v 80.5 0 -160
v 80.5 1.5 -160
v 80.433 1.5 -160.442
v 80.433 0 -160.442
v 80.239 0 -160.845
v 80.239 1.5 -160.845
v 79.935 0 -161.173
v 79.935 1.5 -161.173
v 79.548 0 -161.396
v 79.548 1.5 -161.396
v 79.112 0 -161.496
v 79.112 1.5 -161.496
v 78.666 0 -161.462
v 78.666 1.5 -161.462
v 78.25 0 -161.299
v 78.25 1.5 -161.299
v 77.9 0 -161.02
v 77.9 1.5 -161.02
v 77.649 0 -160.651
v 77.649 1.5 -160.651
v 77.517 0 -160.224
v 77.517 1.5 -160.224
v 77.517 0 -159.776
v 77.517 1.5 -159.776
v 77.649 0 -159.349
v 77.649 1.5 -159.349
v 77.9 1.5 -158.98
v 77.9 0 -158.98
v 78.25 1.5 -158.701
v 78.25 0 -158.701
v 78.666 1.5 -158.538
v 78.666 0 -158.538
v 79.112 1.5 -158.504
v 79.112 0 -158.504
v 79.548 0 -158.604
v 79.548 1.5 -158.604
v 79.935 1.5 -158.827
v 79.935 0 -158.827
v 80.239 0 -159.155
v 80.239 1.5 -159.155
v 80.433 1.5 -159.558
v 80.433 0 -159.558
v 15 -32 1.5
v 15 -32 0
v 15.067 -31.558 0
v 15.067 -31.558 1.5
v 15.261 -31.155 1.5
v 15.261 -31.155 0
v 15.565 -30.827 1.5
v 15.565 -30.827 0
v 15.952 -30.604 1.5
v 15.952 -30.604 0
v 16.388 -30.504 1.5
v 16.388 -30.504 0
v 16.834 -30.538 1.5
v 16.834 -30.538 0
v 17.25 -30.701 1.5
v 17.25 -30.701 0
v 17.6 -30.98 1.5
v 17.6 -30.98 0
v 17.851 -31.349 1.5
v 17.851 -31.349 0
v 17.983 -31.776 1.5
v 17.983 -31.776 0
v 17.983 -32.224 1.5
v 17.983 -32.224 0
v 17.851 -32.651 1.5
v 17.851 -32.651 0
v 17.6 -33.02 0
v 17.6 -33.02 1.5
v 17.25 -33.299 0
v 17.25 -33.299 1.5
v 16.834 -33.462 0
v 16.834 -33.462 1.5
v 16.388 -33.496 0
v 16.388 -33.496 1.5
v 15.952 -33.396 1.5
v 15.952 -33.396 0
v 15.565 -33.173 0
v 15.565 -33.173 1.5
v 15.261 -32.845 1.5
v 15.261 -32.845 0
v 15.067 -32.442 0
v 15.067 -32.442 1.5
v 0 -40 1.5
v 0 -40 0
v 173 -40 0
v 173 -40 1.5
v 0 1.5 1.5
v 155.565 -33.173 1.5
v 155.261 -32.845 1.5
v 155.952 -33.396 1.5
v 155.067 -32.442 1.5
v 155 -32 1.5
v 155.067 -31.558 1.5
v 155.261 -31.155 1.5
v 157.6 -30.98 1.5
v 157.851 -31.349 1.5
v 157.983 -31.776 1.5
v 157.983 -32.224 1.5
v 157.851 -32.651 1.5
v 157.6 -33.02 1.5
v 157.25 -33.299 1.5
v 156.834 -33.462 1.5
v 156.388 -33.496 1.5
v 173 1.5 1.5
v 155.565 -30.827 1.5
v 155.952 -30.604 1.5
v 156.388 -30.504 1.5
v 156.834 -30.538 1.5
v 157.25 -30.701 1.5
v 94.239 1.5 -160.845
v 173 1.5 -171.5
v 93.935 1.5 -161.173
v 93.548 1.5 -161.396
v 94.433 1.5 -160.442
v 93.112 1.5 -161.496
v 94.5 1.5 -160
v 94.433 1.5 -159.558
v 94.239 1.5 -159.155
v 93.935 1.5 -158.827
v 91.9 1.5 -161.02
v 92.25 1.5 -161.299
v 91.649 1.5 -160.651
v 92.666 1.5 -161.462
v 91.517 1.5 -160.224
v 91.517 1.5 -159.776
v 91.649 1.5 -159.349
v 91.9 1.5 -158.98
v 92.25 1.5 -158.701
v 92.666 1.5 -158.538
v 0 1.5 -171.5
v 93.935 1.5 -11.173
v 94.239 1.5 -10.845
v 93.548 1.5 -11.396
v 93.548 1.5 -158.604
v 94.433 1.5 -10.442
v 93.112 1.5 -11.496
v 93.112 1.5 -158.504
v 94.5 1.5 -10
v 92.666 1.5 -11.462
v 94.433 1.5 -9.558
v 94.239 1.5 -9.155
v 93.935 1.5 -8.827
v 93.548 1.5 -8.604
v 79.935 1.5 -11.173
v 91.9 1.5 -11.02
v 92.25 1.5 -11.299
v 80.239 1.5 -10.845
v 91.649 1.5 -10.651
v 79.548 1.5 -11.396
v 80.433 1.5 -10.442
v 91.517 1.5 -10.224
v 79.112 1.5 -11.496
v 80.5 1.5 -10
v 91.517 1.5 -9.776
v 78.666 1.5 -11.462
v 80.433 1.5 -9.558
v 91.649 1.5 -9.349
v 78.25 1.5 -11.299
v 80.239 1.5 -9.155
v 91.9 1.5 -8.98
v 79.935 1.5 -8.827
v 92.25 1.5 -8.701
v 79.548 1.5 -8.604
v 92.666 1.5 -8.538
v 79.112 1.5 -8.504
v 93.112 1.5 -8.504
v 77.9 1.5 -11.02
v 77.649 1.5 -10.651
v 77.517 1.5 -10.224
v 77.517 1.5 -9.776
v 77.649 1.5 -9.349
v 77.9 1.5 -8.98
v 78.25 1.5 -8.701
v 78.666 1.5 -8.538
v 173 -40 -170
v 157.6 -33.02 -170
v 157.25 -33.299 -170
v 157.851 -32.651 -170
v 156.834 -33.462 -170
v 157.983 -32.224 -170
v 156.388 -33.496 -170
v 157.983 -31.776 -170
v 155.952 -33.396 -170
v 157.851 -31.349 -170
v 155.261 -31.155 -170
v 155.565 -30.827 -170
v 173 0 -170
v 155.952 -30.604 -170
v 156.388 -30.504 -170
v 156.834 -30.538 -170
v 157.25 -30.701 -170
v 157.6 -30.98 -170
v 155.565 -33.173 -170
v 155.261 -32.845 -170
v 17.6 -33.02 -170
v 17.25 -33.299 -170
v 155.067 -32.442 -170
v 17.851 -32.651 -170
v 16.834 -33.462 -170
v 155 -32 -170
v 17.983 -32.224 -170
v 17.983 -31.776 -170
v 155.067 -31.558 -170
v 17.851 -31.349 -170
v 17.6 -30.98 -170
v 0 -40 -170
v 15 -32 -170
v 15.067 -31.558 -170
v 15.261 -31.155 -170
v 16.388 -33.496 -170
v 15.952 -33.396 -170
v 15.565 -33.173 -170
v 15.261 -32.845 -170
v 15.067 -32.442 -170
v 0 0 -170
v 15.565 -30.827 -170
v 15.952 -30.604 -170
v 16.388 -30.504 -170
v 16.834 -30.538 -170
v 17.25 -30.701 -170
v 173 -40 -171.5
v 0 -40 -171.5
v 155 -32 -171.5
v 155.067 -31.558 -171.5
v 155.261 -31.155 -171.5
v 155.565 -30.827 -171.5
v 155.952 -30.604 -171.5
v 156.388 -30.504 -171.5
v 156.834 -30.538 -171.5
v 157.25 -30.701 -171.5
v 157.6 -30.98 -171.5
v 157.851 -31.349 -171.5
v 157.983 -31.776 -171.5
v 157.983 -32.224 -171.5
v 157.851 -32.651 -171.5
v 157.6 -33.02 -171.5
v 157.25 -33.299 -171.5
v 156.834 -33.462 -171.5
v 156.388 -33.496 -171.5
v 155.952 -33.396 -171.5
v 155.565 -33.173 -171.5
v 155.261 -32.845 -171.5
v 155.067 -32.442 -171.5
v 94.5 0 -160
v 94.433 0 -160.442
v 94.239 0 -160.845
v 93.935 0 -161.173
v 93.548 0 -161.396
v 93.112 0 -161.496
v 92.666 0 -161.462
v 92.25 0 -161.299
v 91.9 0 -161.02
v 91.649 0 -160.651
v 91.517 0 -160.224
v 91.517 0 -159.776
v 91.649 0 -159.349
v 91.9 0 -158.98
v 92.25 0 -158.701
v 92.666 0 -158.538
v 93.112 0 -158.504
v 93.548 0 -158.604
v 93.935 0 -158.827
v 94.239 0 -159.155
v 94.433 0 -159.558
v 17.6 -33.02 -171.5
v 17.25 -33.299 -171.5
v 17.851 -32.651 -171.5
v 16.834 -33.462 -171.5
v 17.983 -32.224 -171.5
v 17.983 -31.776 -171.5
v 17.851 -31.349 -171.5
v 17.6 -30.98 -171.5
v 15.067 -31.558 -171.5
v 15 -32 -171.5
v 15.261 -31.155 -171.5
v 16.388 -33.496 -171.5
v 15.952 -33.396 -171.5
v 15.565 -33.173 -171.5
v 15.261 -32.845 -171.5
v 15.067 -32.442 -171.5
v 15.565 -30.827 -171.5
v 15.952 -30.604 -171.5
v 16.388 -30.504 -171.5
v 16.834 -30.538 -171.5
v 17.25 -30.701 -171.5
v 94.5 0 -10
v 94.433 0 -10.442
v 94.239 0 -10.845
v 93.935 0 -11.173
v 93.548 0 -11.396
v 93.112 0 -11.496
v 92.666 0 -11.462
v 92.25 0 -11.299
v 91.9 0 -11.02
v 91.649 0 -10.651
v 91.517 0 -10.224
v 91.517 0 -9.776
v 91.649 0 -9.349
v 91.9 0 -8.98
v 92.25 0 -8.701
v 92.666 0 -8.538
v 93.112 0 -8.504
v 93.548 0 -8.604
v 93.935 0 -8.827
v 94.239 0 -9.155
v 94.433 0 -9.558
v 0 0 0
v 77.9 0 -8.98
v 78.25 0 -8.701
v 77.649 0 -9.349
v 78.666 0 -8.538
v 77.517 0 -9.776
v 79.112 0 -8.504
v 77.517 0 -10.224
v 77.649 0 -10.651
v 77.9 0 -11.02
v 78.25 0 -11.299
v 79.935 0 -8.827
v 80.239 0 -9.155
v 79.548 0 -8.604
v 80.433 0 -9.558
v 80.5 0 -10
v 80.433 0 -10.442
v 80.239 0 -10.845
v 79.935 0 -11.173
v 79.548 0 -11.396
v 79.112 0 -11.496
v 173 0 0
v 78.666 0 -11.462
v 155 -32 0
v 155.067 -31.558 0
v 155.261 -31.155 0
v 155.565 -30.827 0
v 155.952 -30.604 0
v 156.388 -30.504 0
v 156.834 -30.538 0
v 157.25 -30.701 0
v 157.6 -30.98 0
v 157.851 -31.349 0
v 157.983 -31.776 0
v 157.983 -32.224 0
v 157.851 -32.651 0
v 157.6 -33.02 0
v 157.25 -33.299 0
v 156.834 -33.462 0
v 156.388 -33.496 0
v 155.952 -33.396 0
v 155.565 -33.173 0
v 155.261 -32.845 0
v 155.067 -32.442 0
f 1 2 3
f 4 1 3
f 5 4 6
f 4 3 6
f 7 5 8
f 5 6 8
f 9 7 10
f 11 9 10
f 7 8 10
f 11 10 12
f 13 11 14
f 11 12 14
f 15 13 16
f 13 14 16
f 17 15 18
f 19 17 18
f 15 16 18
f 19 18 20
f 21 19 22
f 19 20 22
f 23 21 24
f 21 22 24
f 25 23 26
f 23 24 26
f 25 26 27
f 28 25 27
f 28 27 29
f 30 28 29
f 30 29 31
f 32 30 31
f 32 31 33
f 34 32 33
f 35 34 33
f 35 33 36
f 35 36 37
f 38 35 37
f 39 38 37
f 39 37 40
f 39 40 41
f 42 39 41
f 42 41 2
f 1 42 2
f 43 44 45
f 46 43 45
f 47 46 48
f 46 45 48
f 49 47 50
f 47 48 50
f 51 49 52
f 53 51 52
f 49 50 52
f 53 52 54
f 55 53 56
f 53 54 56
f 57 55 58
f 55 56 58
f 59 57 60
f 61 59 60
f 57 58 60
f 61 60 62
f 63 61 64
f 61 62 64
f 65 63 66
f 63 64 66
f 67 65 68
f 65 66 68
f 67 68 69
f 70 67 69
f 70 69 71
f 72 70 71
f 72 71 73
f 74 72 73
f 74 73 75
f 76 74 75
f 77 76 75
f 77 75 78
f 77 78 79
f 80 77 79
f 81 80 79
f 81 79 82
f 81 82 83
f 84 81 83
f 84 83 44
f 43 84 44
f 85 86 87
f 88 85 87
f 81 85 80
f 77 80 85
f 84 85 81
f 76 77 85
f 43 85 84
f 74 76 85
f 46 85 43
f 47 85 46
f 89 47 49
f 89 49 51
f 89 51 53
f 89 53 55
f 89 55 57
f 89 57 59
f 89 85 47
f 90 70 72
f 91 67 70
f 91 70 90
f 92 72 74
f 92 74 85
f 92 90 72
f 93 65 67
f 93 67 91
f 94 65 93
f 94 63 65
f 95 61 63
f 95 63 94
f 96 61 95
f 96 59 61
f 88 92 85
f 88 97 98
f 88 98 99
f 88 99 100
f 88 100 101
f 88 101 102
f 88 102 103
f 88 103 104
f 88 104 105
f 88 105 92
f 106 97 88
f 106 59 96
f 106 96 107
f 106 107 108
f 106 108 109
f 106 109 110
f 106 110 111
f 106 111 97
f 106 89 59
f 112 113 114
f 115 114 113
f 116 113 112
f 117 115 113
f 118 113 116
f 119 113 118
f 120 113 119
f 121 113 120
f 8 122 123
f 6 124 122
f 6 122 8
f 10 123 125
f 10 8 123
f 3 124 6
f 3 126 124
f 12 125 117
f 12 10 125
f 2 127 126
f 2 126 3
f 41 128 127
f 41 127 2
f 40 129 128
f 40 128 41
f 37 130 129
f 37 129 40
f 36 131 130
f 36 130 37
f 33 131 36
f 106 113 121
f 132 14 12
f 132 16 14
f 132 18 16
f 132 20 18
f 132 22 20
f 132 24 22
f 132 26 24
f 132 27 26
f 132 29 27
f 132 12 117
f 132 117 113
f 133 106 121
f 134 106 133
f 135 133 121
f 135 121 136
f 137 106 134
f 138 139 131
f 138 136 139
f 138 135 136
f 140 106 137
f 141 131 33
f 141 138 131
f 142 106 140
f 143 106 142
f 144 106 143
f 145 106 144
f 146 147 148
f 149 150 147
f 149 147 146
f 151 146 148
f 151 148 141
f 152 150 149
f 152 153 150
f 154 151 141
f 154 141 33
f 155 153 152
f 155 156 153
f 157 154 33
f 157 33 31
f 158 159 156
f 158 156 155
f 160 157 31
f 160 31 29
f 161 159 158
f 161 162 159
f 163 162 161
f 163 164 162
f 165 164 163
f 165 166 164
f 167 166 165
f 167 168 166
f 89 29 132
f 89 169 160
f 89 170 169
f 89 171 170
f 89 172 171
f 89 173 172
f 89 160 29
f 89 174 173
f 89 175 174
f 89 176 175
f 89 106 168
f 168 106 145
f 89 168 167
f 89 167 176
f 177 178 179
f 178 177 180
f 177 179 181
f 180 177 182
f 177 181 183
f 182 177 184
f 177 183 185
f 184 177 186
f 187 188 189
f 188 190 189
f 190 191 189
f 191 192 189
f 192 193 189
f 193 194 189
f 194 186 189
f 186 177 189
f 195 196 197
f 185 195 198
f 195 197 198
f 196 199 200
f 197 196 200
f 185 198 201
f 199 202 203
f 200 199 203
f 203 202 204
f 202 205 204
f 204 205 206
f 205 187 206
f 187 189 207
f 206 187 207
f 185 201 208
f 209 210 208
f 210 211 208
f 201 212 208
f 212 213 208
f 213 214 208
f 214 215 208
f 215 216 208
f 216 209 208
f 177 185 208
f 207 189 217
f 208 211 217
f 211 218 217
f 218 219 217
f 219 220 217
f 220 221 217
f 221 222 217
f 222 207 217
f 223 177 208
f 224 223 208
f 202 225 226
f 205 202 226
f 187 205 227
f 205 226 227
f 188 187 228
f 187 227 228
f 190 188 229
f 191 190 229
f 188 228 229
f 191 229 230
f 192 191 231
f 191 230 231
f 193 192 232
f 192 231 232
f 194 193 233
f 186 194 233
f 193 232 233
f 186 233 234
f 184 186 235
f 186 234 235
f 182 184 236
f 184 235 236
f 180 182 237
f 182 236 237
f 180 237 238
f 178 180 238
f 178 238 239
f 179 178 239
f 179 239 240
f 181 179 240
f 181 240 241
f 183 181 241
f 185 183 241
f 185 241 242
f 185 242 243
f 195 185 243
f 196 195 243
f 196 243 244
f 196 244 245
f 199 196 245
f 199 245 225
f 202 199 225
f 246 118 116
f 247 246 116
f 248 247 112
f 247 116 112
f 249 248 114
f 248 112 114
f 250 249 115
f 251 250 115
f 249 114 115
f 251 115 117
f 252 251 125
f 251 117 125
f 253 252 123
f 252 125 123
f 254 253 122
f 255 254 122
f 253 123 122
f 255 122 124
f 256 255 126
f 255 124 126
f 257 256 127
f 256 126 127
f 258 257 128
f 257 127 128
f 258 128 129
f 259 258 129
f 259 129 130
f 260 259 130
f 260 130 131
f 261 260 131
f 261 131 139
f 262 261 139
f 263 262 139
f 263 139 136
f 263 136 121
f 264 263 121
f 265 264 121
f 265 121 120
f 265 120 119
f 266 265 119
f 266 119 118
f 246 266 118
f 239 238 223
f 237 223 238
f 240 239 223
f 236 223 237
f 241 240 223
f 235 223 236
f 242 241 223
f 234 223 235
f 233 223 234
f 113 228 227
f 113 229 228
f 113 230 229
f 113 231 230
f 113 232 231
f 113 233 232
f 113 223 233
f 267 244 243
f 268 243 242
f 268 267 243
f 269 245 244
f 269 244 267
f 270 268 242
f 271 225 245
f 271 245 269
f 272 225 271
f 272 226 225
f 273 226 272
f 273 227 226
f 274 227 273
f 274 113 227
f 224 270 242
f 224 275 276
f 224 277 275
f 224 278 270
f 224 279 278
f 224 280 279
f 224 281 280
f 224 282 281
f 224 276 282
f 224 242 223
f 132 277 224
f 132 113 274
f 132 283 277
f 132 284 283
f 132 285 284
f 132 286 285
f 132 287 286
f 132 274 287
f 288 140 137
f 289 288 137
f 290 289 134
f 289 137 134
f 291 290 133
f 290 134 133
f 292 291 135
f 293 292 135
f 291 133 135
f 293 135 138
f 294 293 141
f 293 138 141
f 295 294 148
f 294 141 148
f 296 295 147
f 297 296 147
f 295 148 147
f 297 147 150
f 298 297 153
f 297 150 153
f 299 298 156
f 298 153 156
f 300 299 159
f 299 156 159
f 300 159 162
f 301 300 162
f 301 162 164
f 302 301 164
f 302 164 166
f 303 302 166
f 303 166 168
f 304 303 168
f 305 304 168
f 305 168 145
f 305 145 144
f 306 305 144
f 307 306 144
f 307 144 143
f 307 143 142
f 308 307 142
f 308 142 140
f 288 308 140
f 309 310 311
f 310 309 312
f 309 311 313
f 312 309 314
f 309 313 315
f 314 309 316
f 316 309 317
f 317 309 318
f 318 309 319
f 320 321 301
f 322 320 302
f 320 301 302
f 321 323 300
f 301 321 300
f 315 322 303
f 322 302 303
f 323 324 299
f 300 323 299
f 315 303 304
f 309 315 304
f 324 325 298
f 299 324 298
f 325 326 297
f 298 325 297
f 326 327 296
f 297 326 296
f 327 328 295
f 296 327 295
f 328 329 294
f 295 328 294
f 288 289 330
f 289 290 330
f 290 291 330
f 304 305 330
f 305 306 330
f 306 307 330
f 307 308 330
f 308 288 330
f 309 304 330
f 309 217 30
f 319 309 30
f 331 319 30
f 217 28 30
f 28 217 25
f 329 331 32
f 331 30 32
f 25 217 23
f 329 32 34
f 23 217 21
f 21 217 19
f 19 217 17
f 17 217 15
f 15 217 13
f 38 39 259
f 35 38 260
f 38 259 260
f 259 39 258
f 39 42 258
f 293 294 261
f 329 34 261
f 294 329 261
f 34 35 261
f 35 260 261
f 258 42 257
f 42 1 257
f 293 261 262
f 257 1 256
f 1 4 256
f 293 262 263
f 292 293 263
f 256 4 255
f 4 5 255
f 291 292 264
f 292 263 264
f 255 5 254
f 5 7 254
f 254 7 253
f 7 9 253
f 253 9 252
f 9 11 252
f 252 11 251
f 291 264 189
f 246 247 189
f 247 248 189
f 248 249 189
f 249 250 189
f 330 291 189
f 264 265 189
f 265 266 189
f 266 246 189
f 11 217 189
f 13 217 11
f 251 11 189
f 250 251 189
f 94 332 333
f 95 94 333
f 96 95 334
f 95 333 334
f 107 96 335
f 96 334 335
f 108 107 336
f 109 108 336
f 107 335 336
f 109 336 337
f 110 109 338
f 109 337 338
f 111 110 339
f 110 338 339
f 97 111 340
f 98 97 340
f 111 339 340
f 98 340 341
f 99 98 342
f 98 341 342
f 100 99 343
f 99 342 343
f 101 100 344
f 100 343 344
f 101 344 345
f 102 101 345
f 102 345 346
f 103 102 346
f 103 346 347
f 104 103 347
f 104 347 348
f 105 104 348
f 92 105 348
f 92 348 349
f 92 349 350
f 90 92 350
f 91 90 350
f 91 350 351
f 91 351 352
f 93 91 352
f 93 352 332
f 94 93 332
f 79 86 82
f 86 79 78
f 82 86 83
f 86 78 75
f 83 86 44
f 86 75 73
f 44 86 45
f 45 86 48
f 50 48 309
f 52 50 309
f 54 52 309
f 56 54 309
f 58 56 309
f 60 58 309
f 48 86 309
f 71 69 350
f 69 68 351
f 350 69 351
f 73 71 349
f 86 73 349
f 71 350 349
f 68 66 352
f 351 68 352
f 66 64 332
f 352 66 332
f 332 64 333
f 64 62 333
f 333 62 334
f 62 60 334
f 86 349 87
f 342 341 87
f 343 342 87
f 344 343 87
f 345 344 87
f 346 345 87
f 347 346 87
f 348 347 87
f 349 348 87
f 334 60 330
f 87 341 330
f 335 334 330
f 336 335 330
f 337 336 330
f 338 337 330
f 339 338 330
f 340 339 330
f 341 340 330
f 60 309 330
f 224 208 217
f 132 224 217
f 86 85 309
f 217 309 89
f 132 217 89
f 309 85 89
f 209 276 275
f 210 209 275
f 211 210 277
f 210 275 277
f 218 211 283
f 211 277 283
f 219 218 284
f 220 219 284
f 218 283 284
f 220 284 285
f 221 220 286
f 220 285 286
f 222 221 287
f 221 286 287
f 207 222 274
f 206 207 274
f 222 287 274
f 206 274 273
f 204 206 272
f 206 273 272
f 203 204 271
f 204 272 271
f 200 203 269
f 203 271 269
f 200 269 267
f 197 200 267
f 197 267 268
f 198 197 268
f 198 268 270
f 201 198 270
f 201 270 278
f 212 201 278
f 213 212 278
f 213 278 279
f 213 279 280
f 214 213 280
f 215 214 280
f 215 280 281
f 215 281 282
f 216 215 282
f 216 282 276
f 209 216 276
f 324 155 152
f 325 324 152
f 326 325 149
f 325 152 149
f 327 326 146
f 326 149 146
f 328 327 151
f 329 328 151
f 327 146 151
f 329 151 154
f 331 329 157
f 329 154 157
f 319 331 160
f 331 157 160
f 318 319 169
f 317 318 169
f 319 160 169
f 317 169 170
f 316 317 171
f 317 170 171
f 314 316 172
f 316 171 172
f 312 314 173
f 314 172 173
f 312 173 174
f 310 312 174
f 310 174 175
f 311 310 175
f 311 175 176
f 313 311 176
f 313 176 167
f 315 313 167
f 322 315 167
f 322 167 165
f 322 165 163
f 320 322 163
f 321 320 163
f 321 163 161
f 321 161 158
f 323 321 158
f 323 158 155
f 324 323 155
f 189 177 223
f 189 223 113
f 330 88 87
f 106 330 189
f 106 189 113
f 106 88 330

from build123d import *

# Parameters (mm, degrees)
SKETCH1_W               = 173
SKETCH1_H               = 170
BOSS_EXTRUDE1_DEPTH     = 1.5
SKETCH2_W               = 173
SKETCH2_H               = 41.5
BOSS_EXTRUDE2_DEPTH     = 1.5
SKETCH3_W               = 173
SKETCH3_H               = 41.5
BOSS_EXTRUDE3_DEPTH     = 1.5
CUT_EXTRUDE1_DEPTH      = 1000
CUT_EXTRUDE1_DEPTH_BACK = 1000
SKETCH4_R               = 1.5
CUT_EXTRUDE2_DEPTH      = 5
CUT_EXTRUDE2_DEPTH_BACK = 5
SKETCH5_R               = 1.5


with BuildPart() as part:
    # Sketch1 → Boss-Extrude1 (new body)
    with BuildSketch(Plane(origin=(0, 0, 0), x_dir=(1, 0, 0), z_dir=(0, 1, 0))):
        with Locations((86.5, 85)):
            Rectangle(SKETCH1_W, SKETCH1_H)
    extrude(amount=BOSS_EXTRUDE1_DEPTH)

    # Sketch2 → Boss-Extrude2 (add)
    with BuildSketch(Plane.XY):
        with Locations((86.5, -19.25)):
            Rectangle(SKETCH2_W, SKETCH2_H)
    extrude(amount=BOSS_EXTRUDE2_DEPTH)

    # Sketch3 → Boss-Extrude3 (add)
    with BuildSketch(Plane(origin=(0, 0, -170), x_dir=(-1, 0, 0), z_dir=(0, 0, -1))):
        with Locations((-86.5, -19.25)):
            Rectangle(SKETCH3_W, SKETCH3_H)
    extrude(amount=BOSS_EXTRUDE3_DEPTH)

    # Sketch4 → Cut-Extrude1 (cut, two sides: drawn at the far end of the back side and taken through both)
    with BuildSketch(Plane(origin=(0, 0, -171.5), x_dir=(-1, 0, 0), z_dir=(0, 0, -1)).offset(-CUT_EXTRUDE1_DEPTH_BACK)):
        with Locations((-156.5, -32)):
            Circle(SKETCH4_R)
        with Locations((-16.5, -32)):
            Circle(SKETCH4_R)
    extrude(amount=CUT_EXTRUDE1_DEPTH + CUT_EXTRUDE1_DEPTH_BACK, mode=Mode.SUBTRACT)

    # Sketch5 → Cut-Extrude2 (cut, two sides: drawn at the far end of the back side and taken through both)
    with BuildSketch(Plane(origin=(0, 1.5, 0), x_dir=(1, 0, 0), z_dir=(0, 1, 0)).offset(-CUT_EXTRUDE2_DEPTH_BACK)):
        with Locations((79, 10)):
            Circle(SKETCH5_R)
        with Locations((79, 160)):
            Circle(SKETCH5_R)
        with Locations((93, 10)):
            Circle(SKETCH5_R)
        with Locations((93, 160)):
            Circle(SKETCH5_R)
    extrude(amount=CUT_EXTRUDE2_DEPTH + CUT_EXTRUDE2_DEPTH_BACK, mode=Mode.SUBTRACT)


solid = part.part
